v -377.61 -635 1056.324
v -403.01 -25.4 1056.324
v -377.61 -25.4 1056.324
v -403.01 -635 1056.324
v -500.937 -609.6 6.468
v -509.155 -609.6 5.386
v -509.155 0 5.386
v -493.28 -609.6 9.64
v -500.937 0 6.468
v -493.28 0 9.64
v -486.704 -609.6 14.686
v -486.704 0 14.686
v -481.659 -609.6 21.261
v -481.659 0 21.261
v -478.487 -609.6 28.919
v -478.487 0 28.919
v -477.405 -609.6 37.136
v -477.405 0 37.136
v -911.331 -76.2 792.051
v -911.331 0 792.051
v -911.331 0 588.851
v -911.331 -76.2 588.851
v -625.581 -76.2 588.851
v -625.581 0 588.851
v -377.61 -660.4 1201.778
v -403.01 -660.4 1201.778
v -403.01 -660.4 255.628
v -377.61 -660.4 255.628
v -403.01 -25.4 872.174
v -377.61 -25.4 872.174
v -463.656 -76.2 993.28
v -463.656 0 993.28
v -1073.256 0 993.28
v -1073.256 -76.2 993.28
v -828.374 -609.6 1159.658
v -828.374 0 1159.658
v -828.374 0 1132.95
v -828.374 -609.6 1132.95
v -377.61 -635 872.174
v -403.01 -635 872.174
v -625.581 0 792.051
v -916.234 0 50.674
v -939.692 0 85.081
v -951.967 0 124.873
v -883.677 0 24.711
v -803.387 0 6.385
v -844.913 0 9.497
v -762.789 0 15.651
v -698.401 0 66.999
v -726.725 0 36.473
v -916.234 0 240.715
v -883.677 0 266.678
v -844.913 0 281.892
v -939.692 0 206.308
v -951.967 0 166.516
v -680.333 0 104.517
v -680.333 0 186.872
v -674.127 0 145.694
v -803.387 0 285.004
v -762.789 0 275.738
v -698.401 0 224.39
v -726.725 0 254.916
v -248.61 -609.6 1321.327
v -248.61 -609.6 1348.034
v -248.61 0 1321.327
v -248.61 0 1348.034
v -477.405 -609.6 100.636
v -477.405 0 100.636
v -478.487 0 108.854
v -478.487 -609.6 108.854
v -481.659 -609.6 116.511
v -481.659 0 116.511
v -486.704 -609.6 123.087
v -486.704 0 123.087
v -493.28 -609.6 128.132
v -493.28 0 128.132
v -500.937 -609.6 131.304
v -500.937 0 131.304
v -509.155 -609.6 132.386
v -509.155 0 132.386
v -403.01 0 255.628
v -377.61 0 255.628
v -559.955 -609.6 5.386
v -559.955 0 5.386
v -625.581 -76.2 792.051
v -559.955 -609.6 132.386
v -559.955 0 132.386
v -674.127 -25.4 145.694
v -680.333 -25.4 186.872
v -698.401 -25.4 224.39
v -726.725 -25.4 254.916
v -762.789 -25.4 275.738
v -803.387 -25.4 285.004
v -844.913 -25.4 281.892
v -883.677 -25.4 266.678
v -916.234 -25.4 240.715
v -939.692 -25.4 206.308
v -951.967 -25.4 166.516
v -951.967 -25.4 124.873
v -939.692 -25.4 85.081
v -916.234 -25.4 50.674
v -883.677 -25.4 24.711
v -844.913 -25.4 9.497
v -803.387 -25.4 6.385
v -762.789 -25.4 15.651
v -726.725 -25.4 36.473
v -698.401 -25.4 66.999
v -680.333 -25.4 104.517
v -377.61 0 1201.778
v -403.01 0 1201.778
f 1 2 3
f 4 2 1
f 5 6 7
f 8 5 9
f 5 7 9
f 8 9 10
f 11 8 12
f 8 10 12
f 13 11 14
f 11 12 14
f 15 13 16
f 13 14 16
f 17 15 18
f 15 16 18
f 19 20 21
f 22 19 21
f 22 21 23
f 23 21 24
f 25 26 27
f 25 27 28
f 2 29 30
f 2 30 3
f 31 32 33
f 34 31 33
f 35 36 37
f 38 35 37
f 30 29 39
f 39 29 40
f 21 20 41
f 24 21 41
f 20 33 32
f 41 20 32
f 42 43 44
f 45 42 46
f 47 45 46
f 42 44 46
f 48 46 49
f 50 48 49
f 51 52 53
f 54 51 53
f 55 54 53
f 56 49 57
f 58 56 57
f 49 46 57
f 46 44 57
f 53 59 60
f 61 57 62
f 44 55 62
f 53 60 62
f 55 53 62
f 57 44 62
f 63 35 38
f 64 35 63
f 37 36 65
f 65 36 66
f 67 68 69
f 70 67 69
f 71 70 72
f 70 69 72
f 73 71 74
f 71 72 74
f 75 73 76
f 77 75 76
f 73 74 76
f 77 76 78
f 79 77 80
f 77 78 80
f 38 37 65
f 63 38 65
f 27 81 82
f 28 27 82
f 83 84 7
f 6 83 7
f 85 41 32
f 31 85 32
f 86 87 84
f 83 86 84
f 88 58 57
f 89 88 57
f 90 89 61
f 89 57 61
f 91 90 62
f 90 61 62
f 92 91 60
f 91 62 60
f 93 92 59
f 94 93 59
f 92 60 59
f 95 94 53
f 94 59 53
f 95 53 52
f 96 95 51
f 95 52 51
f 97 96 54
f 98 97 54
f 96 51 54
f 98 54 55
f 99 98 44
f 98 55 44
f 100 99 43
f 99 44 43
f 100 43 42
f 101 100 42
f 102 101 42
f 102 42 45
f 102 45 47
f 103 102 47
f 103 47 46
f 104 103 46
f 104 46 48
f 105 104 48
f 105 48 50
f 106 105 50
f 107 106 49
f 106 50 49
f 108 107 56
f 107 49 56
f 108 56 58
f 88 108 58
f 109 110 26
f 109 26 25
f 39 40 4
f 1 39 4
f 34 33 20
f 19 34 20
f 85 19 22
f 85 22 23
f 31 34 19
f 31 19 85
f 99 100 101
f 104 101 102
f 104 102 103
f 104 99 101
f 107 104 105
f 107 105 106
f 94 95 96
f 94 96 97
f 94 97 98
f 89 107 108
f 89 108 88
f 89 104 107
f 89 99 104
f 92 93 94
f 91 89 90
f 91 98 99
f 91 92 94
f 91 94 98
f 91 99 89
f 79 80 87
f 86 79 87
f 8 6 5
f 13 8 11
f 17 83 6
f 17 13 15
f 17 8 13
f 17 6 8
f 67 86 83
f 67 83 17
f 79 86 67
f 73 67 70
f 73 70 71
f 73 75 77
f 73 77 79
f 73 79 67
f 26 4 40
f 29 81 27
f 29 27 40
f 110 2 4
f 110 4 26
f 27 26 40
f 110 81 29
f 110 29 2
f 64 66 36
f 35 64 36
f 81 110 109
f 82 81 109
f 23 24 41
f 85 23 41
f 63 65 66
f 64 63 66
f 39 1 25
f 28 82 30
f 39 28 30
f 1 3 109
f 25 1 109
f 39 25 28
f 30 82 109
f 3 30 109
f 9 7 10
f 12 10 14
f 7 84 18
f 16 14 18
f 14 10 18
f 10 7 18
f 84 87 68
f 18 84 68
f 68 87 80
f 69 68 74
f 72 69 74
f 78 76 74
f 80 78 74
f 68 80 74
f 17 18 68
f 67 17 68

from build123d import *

# Parameters (mm, degrees)
F0_R     = 139.7
F1_DEPTH = 25.4
F2_DEPTH = 609.6
F0_W     = 25.4
F0_H     = 946.15
F3_DEPTH = 660.4
F4_W     = 609.6
F4_H     = 184.15
F5_DEPTH = 27.94
F6_DEPTH = 609.6
F7_DEPTH = 76.2


with BuildPart() as f1:
    # F0 (on Front) → F1 (new body)
    with BuildSketch(Plane.XZ):
        with Locations((-813.82694, 145.694448)):
            Circle(F0_R)
    extrude(amount=F1_DEPTH)


with BuildPart() as f2:
    # F0 (on Front) → F2 (new body)
    with BuildSketch(Plane.XZ):
        with BuildLine():
            Line((-559.954882, 132.386144), (-559.954882, 5.386144))
            Line((-559.954882, 5.386144), (-509.154882, 5.386144))
            ThreePointArc((-509.154882, 5.386144), (-486.704241, 14.685504), (-477.404882, 37.136144))
            Line((-477.404882, 37.136144), (-477.404882, 100.636144))
            ThreePointArc((-477.404882, 100.636144), (-486.704241, 123.086785), (-509.154882, 132.386144))
            Line((-509.154882, 132.386144), (-559.954882, 132.386144))
        make_face()
    extrude(amount=F2_DEPTH)


with BuildPart() as f3:
    # F0 (on Front) → F3 (new body)
    with BuildSketch(Plane.XZ):
        with Locations((-390.310488, 728.703228)):
            Rectangle(F0_W, F0_H)
    extrude(amount=F3_DEPTH)

    # F4 (on face) → F5 (cut)
    with BuildSketch(Plane(origin=(-403.010488, 0, 0), x_dir=(0, -1, 0), z_dir=(-1, 0, 0))):
        with Locations((330.2, 964.249048)):
            Rectangle(F4_W, F4_H)
    extrude(amount=-F5_DEPTH, mode=Mode.SUBTRACT)


with BuildPart() as f6:
    # F0 (on Front) → F6 (new body)
    with BuildSketch(Plane.XZ):
        Polygon((-248.610014, 1348.034387), (-828.374067, 1159.657627), (-828.374067, 1132.950487), (-248.610014, 1321.327247), align=None)
    extrude(amount=F6_DEPTH)


with BuildPart() as f7:
    # F0 (on Front) → F7 (new body)
    with BuildSketch(Plane.XZ):
        Polygon((-463.656493, 993.280113), (-1073.256493, 993.280113), (-911.331493, 792.051333), (-911.331493, 588.851333), (-625.581493, 588.851333), (-625.581493, 792.051333), align=None)
    extrude(amount=F7_DEPTH)


solid = Compound([f1.part, f2.part, f3.part, f6.part, f7.part])
